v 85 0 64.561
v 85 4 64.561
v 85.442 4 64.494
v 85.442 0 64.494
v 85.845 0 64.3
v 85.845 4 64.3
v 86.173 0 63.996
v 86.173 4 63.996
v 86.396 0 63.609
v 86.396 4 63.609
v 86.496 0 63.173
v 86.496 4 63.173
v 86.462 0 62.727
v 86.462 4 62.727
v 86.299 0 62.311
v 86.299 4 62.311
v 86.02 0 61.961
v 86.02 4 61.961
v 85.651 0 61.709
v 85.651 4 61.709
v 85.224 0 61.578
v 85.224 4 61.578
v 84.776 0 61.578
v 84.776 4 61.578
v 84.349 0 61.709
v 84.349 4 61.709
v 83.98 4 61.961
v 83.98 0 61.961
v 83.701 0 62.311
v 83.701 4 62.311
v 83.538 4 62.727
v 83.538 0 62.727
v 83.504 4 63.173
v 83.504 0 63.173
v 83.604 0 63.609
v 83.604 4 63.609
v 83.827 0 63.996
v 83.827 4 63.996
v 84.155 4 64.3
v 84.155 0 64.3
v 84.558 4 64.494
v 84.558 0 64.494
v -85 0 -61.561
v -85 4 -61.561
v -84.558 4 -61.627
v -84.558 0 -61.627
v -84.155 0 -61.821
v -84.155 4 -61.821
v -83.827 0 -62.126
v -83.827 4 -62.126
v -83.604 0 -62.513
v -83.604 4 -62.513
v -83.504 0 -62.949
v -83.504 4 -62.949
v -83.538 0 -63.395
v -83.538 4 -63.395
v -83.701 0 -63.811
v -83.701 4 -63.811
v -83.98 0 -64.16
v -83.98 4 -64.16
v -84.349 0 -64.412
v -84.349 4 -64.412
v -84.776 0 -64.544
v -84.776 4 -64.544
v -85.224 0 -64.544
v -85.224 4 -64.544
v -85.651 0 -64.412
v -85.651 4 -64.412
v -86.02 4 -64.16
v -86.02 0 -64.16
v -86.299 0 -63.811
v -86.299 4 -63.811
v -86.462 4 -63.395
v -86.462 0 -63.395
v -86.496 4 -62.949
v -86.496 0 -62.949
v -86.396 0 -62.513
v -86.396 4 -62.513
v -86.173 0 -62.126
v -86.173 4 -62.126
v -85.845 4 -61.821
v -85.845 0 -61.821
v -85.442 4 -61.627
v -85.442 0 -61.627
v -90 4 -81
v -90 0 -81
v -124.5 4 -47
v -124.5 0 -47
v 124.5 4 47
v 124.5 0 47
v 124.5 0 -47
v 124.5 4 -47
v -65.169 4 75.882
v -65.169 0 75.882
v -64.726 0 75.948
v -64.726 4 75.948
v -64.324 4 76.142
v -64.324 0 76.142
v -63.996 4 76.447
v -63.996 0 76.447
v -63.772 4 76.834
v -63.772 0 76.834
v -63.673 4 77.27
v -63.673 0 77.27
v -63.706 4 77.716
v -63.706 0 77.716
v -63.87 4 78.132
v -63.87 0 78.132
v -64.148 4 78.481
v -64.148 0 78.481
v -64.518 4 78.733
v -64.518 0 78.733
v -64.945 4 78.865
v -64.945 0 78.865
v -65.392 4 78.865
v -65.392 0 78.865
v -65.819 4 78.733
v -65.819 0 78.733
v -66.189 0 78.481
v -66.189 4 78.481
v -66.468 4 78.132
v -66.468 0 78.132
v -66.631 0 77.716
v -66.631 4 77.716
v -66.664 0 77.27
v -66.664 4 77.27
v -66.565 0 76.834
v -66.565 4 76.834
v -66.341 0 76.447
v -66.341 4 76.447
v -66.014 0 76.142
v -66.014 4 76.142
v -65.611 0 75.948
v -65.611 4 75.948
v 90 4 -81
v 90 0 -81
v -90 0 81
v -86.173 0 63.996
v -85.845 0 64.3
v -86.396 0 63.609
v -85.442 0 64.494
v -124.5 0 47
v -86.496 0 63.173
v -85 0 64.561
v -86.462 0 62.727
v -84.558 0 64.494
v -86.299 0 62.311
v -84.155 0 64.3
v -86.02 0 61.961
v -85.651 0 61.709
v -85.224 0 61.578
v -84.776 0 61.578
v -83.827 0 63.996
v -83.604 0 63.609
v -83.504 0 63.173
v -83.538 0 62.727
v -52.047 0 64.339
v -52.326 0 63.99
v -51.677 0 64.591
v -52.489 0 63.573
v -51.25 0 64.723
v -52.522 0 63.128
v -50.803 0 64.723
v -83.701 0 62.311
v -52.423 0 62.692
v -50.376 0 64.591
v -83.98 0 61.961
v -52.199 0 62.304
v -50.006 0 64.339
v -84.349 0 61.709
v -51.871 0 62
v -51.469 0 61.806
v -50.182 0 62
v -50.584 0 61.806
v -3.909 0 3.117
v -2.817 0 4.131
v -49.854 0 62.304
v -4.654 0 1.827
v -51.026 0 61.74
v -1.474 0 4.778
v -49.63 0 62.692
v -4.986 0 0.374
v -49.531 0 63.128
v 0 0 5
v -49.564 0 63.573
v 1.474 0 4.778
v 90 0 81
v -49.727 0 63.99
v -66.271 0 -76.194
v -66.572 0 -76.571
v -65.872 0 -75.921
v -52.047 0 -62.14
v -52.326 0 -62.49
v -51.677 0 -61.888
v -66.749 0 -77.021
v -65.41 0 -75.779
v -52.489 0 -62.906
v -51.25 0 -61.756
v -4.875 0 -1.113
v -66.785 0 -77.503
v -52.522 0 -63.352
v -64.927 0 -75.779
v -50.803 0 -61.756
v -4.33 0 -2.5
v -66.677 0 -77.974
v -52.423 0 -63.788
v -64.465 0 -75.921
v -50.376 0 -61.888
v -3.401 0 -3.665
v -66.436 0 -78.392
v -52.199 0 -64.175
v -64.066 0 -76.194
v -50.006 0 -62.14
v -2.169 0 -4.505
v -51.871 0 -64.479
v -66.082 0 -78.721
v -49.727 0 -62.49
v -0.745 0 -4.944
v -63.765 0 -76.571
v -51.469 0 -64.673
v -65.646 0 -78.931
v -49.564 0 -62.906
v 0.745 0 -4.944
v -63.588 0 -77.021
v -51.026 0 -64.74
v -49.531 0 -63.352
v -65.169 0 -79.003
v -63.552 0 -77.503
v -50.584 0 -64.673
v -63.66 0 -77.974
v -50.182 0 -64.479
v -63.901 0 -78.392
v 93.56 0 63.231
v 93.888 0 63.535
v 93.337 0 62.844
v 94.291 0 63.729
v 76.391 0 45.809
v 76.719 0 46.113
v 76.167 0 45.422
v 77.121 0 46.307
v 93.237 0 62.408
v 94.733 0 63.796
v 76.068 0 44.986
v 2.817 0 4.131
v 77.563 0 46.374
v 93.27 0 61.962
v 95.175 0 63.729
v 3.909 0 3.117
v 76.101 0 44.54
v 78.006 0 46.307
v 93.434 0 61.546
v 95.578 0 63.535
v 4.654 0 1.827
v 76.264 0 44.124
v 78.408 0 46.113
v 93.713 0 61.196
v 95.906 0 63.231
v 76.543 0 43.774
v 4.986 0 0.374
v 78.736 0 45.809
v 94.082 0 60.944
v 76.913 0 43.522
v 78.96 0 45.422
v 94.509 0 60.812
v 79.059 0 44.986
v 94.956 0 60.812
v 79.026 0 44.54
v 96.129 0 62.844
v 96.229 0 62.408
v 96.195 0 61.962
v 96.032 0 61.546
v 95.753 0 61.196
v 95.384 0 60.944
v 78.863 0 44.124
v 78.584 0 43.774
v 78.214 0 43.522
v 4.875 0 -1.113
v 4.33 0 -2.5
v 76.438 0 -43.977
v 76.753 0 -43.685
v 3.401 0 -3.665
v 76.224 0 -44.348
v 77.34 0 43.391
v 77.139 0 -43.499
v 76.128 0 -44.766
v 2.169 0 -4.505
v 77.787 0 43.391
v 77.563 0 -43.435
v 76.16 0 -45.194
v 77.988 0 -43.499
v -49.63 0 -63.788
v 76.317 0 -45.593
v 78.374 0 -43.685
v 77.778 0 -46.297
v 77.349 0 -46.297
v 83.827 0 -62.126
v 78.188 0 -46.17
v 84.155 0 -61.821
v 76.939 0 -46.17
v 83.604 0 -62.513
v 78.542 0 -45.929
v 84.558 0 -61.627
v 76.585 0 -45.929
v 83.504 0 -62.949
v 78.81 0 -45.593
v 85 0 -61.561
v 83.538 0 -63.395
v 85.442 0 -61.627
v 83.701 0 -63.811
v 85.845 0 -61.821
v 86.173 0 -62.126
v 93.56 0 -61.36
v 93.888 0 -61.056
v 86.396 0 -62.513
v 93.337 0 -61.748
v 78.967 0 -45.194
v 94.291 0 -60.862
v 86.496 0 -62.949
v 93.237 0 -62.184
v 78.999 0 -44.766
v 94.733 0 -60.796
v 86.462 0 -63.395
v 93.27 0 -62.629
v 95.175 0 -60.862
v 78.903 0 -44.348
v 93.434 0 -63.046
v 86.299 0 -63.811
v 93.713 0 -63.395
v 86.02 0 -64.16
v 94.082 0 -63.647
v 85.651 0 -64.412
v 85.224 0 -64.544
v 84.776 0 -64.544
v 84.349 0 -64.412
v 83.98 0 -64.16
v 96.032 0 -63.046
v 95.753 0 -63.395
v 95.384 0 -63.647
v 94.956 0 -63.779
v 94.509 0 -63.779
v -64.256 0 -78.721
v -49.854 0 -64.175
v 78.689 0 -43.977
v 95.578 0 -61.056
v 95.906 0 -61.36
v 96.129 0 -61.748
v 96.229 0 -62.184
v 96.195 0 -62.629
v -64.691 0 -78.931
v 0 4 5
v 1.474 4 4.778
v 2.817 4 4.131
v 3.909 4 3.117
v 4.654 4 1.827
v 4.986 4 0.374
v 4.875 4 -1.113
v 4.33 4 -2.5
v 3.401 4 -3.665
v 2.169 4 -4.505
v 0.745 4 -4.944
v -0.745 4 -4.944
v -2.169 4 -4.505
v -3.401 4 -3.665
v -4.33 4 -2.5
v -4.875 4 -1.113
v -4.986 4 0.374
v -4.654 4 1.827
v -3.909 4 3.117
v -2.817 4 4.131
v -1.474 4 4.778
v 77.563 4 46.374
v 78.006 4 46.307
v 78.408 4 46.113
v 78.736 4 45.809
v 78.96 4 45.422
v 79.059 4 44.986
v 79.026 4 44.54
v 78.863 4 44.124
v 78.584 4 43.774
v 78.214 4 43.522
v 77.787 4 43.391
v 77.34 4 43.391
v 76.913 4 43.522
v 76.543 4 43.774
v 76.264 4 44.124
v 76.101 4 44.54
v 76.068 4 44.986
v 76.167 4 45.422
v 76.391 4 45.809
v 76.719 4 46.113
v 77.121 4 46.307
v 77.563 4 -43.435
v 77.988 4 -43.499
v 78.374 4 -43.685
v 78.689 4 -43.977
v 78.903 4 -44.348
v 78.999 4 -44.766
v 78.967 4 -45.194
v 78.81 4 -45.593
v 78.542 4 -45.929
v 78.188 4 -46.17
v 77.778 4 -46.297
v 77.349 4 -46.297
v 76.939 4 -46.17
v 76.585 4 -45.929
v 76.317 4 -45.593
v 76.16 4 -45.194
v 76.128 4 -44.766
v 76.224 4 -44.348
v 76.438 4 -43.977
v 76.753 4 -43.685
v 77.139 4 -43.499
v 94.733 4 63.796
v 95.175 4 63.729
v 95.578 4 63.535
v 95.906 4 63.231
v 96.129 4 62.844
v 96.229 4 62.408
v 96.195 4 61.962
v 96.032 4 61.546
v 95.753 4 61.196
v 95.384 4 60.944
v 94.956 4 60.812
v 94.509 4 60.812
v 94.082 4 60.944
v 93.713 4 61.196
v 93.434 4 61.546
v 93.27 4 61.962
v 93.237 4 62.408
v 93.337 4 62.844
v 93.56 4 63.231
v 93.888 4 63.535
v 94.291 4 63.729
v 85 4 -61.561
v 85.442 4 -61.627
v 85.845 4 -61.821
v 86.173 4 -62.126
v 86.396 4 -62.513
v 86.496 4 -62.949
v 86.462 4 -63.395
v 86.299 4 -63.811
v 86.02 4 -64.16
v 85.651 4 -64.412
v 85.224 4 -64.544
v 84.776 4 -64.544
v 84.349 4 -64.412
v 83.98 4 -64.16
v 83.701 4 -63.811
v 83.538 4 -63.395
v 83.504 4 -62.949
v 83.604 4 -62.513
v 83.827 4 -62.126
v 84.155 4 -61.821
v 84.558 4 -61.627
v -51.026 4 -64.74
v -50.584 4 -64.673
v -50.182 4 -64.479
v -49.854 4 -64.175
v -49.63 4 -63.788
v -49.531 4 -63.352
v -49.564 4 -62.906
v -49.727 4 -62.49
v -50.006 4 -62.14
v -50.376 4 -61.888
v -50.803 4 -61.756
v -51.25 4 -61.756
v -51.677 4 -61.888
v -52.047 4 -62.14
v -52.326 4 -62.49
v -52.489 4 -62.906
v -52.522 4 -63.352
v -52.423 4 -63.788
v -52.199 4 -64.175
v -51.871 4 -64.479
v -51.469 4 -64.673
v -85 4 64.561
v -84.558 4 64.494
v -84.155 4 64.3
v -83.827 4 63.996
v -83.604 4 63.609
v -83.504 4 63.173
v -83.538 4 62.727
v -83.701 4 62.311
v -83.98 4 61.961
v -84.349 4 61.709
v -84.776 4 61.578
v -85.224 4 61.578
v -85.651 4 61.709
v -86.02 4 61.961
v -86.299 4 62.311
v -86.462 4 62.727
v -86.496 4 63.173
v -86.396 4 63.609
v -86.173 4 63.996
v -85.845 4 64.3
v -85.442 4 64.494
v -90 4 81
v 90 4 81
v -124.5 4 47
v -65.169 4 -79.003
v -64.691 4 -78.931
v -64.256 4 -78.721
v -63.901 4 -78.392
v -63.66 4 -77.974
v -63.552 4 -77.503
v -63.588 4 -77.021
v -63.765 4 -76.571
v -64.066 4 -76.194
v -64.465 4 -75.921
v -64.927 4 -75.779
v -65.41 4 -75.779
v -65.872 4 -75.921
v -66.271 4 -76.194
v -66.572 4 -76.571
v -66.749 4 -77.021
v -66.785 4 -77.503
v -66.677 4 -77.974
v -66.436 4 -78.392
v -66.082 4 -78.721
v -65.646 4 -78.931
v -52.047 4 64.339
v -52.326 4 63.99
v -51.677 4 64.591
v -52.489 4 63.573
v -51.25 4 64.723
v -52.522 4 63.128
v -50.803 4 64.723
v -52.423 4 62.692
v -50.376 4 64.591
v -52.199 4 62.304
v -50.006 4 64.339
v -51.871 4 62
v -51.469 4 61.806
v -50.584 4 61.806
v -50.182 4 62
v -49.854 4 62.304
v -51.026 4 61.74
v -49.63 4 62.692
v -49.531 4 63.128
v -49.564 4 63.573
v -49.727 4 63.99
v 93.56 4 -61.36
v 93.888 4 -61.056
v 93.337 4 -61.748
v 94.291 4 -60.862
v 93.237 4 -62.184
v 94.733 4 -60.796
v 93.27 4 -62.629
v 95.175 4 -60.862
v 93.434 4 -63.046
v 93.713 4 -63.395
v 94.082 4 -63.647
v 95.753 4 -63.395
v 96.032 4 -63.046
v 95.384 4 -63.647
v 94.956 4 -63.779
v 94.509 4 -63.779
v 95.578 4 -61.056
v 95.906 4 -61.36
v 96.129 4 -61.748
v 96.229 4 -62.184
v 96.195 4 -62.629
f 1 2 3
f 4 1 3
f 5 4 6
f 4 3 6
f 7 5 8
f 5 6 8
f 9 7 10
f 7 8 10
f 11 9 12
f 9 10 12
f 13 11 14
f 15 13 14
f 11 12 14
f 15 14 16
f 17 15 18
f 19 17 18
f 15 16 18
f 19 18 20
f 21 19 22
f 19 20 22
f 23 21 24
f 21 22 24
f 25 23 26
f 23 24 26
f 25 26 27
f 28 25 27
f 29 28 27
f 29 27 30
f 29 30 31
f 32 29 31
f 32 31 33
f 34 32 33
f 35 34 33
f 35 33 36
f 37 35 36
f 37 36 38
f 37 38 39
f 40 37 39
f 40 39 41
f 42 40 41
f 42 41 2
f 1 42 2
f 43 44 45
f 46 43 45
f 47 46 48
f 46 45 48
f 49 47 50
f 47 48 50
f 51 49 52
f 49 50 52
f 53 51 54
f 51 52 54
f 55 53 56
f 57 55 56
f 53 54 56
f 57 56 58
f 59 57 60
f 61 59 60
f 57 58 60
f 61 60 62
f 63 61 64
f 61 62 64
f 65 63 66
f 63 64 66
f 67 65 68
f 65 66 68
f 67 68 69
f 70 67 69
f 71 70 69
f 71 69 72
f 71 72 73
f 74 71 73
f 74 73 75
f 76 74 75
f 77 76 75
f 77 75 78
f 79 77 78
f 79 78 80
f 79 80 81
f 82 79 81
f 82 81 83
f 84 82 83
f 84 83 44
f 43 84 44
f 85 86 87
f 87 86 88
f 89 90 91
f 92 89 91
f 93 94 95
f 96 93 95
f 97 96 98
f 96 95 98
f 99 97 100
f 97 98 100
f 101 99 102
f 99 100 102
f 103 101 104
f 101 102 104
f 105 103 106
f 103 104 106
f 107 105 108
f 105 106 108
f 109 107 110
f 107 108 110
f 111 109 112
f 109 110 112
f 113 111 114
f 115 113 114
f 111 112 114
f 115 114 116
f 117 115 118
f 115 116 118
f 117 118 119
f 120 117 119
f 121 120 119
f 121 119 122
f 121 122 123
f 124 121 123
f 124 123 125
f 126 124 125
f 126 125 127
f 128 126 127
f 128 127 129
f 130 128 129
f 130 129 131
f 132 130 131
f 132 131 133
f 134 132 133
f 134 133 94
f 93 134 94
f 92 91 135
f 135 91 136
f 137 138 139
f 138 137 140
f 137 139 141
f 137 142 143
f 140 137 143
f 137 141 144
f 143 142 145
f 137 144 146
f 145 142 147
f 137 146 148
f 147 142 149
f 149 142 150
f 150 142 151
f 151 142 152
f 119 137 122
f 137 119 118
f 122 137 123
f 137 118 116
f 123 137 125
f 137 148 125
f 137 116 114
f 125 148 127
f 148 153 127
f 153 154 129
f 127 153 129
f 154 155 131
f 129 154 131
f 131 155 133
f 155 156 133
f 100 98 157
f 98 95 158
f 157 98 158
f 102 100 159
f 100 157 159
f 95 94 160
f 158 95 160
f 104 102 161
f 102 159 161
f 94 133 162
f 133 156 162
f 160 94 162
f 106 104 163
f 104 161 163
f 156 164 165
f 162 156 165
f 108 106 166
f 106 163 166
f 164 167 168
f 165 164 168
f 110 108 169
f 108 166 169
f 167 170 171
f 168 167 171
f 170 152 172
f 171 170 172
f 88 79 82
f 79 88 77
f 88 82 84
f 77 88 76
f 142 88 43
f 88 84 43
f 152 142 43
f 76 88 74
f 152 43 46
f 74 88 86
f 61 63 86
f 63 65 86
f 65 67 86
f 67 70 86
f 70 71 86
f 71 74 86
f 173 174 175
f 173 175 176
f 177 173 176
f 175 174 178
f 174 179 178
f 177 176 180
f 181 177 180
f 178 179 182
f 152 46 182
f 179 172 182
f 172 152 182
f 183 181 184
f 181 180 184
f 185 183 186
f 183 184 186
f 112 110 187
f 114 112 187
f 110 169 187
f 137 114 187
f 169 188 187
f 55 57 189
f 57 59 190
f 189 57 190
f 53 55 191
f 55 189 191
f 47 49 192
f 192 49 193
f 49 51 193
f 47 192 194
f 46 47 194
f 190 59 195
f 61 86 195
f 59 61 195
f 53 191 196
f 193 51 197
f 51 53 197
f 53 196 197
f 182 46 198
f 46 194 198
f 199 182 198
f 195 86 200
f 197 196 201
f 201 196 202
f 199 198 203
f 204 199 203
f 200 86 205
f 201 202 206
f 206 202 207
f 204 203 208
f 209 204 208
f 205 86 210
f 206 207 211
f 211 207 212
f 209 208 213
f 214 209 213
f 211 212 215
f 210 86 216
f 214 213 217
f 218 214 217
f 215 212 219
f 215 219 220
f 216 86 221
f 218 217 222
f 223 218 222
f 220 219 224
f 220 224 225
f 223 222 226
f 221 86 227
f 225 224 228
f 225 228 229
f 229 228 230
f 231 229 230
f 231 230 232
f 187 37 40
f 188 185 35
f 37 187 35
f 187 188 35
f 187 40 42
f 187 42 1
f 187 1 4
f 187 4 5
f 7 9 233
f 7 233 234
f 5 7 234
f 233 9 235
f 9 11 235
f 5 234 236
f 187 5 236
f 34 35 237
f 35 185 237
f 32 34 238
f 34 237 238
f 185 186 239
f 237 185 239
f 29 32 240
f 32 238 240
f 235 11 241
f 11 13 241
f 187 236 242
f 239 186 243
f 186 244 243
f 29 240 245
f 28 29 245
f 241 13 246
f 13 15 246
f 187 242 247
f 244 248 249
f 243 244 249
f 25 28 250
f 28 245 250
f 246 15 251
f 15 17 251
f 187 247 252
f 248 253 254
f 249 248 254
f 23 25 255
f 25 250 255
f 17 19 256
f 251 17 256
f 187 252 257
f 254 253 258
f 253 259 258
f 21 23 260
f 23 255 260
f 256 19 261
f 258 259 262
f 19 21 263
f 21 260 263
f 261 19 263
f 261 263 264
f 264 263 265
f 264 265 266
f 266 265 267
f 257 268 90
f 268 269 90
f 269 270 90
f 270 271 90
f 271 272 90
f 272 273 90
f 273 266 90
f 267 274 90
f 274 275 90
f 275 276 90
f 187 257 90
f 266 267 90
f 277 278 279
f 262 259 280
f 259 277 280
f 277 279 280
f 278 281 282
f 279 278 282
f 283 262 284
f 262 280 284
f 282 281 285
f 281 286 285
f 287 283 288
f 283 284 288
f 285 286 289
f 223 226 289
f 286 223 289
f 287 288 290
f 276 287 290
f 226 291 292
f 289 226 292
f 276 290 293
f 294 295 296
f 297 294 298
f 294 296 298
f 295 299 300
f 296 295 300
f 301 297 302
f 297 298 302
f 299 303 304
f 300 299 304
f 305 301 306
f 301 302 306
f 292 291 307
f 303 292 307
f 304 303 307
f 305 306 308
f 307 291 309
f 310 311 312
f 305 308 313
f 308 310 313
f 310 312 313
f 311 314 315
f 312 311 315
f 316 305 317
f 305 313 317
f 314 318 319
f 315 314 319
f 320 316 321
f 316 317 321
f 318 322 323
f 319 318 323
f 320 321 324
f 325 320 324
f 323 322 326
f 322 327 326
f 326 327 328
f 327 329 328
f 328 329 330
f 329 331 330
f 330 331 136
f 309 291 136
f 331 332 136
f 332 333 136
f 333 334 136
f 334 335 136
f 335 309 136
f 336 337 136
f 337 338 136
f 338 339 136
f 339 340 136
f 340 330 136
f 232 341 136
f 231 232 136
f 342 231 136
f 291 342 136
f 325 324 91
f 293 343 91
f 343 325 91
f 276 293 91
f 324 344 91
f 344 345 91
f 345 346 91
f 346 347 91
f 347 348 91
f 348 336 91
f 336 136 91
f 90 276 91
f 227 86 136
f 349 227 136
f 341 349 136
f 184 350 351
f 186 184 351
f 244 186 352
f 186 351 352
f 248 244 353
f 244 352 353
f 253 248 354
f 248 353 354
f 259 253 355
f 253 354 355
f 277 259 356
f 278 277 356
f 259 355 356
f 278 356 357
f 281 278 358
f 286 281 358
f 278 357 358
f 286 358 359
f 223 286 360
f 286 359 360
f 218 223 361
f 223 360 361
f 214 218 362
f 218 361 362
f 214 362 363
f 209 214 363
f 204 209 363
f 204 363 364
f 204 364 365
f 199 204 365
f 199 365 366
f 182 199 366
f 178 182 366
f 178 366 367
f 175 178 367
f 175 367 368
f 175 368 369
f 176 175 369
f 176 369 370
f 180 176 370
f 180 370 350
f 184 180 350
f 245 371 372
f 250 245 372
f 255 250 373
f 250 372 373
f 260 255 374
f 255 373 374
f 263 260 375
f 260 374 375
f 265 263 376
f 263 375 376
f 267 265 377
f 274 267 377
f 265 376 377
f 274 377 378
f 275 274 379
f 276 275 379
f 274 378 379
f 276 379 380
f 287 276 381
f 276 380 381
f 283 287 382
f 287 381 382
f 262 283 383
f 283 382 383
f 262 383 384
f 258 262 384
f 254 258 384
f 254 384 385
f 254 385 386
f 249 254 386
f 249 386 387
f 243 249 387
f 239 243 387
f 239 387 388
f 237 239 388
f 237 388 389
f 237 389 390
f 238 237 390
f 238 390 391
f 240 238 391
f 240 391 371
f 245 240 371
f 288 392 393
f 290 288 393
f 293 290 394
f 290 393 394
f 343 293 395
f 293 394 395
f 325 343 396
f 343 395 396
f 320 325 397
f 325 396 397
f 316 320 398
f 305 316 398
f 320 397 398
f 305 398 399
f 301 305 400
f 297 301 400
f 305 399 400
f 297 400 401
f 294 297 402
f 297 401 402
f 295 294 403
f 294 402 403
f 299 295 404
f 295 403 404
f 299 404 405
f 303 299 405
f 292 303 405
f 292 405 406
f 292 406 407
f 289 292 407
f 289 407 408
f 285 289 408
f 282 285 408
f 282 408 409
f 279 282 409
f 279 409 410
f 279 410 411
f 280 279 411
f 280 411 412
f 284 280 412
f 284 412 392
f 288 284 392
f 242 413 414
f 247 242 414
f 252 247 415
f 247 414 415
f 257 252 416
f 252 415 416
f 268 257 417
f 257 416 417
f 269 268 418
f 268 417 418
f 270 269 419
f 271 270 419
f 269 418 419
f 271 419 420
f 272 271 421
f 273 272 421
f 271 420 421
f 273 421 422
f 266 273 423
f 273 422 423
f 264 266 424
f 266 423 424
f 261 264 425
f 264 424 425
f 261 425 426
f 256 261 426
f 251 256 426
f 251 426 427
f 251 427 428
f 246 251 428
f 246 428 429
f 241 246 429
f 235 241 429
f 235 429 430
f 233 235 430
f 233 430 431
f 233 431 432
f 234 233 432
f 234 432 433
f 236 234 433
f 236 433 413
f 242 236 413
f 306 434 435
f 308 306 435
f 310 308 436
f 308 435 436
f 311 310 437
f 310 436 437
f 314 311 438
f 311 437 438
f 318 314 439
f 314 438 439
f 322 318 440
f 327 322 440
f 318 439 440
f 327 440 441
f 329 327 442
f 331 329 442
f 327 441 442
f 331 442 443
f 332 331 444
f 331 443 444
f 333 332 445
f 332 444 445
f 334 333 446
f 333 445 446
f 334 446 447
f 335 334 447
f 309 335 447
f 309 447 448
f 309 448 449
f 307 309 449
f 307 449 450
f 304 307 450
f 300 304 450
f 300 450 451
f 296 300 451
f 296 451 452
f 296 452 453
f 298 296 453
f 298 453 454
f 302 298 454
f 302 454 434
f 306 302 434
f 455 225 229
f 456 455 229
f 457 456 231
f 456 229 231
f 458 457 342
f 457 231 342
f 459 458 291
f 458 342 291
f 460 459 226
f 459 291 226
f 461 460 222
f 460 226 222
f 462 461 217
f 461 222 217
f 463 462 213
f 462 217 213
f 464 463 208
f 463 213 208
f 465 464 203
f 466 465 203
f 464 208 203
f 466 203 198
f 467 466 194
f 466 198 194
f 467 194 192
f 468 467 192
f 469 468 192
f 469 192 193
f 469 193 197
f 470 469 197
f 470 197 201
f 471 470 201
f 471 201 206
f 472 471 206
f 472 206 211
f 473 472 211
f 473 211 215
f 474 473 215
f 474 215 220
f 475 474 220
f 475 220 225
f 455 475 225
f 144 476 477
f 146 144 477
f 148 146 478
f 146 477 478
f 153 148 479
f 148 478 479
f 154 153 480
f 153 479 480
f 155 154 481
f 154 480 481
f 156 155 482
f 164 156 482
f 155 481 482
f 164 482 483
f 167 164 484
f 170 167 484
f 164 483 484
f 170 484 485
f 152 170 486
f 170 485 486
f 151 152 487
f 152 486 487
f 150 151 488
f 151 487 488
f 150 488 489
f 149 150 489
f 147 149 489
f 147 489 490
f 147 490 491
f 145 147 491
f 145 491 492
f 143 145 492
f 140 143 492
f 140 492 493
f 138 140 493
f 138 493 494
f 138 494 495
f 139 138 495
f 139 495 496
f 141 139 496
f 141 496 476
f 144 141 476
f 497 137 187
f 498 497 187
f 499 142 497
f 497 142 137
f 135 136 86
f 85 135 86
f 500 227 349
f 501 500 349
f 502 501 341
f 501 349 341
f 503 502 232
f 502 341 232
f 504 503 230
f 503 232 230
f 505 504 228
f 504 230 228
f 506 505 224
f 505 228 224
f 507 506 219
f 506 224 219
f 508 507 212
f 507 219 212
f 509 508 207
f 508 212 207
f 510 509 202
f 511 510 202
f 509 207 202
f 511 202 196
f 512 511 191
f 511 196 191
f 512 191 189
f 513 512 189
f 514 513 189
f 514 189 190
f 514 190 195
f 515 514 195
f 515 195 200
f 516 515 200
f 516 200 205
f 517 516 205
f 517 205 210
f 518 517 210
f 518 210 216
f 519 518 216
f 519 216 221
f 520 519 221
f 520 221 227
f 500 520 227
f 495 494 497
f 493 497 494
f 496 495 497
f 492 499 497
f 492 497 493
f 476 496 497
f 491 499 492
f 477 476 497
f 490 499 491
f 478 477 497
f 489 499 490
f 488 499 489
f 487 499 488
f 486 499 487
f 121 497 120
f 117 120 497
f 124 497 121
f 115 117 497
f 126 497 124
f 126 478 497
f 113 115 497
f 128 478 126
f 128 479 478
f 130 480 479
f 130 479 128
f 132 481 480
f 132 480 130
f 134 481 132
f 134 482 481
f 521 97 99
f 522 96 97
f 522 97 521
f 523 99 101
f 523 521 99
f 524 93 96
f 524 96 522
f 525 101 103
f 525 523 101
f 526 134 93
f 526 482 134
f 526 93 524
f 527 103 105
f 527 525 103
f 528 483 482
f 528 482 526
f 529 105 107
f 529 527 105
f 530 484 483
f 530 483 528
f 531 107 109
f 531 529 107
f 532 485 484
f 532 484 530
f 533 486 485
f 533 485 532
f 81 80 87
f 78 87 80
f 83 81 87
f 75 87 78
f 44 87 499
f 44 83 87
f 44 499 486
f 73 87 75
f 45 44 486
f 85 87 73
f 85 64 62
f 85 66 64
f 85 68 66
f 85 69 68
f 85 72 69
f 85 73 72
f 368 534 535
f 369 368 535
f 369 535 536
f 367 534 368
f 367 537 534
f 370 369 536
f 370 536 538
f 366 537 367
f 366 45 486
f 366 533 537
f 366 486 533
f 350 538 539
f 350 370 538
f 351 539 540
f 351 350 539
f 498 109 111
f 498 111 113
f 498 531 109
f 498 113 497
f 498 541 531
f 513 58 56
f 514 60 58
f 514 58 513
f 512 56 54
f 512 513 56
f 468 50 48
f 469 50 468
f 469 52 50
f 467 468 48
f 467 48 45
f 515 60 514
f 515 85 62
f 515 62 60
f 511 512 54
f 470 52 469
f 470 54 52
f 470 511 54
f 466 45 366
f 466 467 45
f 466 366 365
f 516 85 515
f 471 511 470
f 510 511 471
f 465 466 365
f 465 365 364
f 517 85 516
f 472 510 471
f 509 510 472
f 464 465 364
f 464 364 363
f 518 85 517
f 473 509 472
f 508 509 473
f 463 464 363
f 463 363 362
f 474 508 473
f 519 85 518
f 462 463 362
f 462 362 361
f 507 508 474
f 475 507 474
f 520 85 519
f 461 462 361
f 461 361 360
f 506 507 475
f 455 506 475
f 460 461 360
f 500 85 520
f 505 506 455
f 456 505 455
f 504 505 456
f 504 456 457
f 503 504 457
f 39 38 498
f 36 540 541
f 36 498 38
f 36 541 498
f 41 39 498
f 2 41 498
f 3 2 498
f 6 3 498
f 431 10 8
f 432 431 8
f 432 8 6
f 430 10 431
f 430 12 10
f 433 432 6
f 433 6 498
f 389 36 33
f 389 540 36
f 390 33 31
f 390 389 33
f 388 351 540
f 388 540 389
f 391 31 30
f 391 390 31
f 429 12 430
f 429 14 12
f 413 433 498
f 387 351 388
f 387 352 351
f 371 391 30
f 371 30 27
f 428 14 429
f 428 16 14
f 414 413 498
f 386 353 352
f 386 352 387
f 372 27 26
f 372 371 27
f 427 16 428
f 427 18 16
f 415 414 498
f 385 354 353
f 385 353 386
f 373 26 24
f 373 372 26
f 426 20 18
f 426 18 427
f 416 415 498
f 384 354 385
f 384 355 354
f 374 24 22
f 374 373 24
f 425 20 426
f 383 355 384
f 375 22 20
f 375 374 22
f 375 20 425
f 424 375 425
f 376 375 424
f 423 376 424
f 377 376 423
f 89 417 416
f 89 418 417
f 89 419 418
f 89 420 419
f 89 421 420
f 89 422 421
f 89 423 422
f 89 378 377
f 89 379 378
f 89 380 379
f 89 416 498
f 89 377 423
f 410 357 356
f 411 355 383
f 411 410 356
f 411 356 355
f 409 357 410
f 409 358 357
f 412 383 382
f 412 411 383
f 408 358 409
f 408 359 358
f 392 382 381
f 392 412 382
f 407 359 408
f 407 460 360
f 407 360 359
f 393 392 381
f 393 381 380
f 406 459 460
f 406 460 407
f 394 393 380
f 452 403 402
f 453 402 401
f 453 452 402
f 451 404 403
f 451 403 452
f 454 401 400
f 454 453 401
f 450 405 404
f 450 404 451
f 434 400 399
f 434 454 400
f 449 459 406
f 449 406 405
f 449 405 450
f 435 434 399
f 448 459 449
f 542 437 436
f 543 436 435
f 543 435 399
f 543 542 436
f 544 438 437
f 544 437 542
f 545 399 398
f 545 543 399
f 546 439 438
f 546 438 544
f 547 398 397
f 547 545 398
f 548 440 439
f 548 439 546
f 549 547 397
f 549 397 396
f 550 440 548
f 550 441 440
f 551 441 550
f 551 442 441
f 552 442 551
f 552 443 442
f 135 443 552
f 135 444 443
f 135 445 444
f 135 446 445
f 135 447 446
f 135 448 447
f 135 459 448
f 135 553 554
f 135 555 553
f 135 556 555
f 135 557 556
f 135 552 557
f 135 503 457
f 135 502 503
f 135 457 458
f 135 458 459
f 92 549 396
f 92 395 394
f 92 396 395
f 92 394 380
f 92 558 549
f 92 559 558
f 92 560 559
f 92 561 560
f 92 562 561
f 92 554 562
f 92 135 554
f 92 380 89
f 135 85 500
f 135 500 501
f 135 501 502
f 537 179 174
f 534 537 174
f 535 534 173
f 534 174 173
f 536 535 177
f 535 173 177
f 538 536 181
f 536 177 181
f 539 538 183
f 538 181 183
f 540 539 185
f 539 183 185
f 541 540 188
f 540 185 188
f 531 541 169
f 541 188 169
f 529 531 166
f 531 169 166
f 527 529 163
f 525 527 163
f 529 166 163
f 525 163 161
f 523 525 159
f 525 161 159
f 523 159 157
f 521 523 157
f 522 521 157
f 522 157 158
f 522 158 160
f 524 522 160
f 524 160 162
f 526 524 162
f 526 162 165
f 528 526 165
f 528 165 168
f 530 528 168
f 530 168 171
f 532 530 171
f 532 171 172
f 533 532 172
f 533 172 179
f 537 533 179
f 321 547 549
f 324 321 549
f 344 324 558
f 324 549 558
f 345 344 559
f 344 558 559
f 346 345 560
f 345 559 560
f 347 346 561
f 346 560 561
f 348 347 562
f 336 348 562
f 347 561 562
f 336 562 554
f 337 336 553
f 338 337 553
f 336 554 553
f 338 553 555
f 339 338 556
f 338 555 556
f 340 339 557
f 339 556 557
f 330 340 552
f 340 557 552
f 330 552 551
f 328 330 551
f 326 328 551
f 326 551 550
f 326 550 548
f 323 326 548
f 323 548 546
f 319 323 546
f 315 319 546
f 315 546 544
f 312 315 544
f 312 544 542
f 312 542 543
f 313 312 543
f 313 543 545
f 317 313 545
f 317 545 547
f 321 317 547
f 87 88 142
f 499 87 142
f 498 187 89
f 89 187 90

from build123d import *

# Parameters (mm, degrees)
SALIENTE_EXTRUIR1_DEPTH = 4
CROQUIS2_R              = 1.5
CORTAR_EXTRUIR1_DEPTH   = 10
CROQUIS3_R              = 1.5
CROQUIS3_R_2            = 1.439143575
CORTAR_EXTRUIR2_DEPTH   = 10
CROQUIS4_R              = 1.620915762
CROQUIS4_R_2            = 1.5
CORTAR_EXTRUIR3_DEPTH   = 50
CROQUIS5_R              = 5
CORTAR_EXTRUIR4_DEPTH   = 10


with BuildPart() as part:
    # Croquis1 → Saliente-Extruir1 (new body)
    with BuildSketch(Plane(origin=(0, 0, 0), x_dir=(1, 0, 0), z_dir=(0, 1, 0))):
        Polygon((-90, 81), (-124.5, 47), (-124.5, -47), (-90, -81), (0, -81), (90, -81), (124.5, -47), (124.5, 47), (90, 81), (0, 81), align=None)
    extrude(amount=SALIENTE_EXTRUIR1_DEPTH)

    # Croquis2 → Cortar-Extruir1 (cut)
    with BuildSketch(Plane(origin=(0, 4, 0), x_dir=(1, 0, 0), z_dir=(0, 1, 0))):
        with Locations(Location((-85, 63.060809699, 0), (0, 0, 270))):
            Circle(CROQUIS2_R)
        with Locations(Location((-85, -63.060809699, 0), (0, 0, 270))):
            Circle(CROQUIS2_R)
        with Locations(Location((85, -63.060809699, 0), (0, 0, 270))):
            Circle(CROQUIS2_R)
        with Locations(Location((85, 63.060809699, 0), (0, 0, 270))):
            Circle(CROQUIS2_R)
    extrude(amount=-CORTAR_EXTRUIR1_DEPTH, mode=Mode.SUBTRACT)

    # Croquis3 → Cortar-Extruir2 (cut)
    with BuildSketch(Plane(origin=(0, 4, 0), x_dir=(1, 0, 0), z_dir=(0, 1, 0))):
        with Locations(Location((94.732844127, -62.29571743, 0), (0, 0, 270))):
            Circle(CROQUIS3_R)
        with Locations(Location((77.563491473, -44.873874295, 0), (0, 0, 270))):
            Circle(CROQUIS3_R)
        with Locations(Location((77.563491473, 44.873874295, 0), (0, 0, 270))):
            Circle(CROQUIS3_R_2)
        with Locations(Location((94.732844127, 62.29571743, 0), (0, 0, 270))):
            Circle(CROQUIS3_R)
    extrude(amount=-CORTAR_EXTRUIR2_DEPTH, mode=Mode.SUBTRACT)

    # Croquis4 → Cortar-Extruir3 (cut)
    with BuildSketch(Plane.XZ):
        with Locations(Location((-65.16861846, -77.381821896, 0), (0, 0, 270))):
            Circle(CROQUIS4_R)
        with Locations(Location((-51.026482836, -63.239686272, 0), (0, 0, 270))):
            Circle(CROQUIS4_R_2)
        with Locations(Location((-65.16861846, 77.381821896, 0), (0, 0, 270))):
            Circle(CROQUIS4_R_2)
        with Locations(Location((-51.026482836, 63.239686272, 0), (0, 0, 270))):
            Circle(CROQUIS4_R_2)
    extrude(amount=-CORTAR_EXTRUIR3_DEPTH, mode=Mode.SUBTRACT)

    # Croquis5 → Cortar-Extruir4 (cut)
    with BuildSketch(Plane(origin=(0, 4, 0), x_dir=(1, 0, 0), z_dir=(0, 1, 0))):
        with Locations(Location((0, 0, 0), (0, 0, 270))):
            Circle(CROQUIS5_R)
    extrude(amount=-CORTAR_EXTRUIR4_DEPTH, mode=Mode.SUBTRACT)


solid = part.part
